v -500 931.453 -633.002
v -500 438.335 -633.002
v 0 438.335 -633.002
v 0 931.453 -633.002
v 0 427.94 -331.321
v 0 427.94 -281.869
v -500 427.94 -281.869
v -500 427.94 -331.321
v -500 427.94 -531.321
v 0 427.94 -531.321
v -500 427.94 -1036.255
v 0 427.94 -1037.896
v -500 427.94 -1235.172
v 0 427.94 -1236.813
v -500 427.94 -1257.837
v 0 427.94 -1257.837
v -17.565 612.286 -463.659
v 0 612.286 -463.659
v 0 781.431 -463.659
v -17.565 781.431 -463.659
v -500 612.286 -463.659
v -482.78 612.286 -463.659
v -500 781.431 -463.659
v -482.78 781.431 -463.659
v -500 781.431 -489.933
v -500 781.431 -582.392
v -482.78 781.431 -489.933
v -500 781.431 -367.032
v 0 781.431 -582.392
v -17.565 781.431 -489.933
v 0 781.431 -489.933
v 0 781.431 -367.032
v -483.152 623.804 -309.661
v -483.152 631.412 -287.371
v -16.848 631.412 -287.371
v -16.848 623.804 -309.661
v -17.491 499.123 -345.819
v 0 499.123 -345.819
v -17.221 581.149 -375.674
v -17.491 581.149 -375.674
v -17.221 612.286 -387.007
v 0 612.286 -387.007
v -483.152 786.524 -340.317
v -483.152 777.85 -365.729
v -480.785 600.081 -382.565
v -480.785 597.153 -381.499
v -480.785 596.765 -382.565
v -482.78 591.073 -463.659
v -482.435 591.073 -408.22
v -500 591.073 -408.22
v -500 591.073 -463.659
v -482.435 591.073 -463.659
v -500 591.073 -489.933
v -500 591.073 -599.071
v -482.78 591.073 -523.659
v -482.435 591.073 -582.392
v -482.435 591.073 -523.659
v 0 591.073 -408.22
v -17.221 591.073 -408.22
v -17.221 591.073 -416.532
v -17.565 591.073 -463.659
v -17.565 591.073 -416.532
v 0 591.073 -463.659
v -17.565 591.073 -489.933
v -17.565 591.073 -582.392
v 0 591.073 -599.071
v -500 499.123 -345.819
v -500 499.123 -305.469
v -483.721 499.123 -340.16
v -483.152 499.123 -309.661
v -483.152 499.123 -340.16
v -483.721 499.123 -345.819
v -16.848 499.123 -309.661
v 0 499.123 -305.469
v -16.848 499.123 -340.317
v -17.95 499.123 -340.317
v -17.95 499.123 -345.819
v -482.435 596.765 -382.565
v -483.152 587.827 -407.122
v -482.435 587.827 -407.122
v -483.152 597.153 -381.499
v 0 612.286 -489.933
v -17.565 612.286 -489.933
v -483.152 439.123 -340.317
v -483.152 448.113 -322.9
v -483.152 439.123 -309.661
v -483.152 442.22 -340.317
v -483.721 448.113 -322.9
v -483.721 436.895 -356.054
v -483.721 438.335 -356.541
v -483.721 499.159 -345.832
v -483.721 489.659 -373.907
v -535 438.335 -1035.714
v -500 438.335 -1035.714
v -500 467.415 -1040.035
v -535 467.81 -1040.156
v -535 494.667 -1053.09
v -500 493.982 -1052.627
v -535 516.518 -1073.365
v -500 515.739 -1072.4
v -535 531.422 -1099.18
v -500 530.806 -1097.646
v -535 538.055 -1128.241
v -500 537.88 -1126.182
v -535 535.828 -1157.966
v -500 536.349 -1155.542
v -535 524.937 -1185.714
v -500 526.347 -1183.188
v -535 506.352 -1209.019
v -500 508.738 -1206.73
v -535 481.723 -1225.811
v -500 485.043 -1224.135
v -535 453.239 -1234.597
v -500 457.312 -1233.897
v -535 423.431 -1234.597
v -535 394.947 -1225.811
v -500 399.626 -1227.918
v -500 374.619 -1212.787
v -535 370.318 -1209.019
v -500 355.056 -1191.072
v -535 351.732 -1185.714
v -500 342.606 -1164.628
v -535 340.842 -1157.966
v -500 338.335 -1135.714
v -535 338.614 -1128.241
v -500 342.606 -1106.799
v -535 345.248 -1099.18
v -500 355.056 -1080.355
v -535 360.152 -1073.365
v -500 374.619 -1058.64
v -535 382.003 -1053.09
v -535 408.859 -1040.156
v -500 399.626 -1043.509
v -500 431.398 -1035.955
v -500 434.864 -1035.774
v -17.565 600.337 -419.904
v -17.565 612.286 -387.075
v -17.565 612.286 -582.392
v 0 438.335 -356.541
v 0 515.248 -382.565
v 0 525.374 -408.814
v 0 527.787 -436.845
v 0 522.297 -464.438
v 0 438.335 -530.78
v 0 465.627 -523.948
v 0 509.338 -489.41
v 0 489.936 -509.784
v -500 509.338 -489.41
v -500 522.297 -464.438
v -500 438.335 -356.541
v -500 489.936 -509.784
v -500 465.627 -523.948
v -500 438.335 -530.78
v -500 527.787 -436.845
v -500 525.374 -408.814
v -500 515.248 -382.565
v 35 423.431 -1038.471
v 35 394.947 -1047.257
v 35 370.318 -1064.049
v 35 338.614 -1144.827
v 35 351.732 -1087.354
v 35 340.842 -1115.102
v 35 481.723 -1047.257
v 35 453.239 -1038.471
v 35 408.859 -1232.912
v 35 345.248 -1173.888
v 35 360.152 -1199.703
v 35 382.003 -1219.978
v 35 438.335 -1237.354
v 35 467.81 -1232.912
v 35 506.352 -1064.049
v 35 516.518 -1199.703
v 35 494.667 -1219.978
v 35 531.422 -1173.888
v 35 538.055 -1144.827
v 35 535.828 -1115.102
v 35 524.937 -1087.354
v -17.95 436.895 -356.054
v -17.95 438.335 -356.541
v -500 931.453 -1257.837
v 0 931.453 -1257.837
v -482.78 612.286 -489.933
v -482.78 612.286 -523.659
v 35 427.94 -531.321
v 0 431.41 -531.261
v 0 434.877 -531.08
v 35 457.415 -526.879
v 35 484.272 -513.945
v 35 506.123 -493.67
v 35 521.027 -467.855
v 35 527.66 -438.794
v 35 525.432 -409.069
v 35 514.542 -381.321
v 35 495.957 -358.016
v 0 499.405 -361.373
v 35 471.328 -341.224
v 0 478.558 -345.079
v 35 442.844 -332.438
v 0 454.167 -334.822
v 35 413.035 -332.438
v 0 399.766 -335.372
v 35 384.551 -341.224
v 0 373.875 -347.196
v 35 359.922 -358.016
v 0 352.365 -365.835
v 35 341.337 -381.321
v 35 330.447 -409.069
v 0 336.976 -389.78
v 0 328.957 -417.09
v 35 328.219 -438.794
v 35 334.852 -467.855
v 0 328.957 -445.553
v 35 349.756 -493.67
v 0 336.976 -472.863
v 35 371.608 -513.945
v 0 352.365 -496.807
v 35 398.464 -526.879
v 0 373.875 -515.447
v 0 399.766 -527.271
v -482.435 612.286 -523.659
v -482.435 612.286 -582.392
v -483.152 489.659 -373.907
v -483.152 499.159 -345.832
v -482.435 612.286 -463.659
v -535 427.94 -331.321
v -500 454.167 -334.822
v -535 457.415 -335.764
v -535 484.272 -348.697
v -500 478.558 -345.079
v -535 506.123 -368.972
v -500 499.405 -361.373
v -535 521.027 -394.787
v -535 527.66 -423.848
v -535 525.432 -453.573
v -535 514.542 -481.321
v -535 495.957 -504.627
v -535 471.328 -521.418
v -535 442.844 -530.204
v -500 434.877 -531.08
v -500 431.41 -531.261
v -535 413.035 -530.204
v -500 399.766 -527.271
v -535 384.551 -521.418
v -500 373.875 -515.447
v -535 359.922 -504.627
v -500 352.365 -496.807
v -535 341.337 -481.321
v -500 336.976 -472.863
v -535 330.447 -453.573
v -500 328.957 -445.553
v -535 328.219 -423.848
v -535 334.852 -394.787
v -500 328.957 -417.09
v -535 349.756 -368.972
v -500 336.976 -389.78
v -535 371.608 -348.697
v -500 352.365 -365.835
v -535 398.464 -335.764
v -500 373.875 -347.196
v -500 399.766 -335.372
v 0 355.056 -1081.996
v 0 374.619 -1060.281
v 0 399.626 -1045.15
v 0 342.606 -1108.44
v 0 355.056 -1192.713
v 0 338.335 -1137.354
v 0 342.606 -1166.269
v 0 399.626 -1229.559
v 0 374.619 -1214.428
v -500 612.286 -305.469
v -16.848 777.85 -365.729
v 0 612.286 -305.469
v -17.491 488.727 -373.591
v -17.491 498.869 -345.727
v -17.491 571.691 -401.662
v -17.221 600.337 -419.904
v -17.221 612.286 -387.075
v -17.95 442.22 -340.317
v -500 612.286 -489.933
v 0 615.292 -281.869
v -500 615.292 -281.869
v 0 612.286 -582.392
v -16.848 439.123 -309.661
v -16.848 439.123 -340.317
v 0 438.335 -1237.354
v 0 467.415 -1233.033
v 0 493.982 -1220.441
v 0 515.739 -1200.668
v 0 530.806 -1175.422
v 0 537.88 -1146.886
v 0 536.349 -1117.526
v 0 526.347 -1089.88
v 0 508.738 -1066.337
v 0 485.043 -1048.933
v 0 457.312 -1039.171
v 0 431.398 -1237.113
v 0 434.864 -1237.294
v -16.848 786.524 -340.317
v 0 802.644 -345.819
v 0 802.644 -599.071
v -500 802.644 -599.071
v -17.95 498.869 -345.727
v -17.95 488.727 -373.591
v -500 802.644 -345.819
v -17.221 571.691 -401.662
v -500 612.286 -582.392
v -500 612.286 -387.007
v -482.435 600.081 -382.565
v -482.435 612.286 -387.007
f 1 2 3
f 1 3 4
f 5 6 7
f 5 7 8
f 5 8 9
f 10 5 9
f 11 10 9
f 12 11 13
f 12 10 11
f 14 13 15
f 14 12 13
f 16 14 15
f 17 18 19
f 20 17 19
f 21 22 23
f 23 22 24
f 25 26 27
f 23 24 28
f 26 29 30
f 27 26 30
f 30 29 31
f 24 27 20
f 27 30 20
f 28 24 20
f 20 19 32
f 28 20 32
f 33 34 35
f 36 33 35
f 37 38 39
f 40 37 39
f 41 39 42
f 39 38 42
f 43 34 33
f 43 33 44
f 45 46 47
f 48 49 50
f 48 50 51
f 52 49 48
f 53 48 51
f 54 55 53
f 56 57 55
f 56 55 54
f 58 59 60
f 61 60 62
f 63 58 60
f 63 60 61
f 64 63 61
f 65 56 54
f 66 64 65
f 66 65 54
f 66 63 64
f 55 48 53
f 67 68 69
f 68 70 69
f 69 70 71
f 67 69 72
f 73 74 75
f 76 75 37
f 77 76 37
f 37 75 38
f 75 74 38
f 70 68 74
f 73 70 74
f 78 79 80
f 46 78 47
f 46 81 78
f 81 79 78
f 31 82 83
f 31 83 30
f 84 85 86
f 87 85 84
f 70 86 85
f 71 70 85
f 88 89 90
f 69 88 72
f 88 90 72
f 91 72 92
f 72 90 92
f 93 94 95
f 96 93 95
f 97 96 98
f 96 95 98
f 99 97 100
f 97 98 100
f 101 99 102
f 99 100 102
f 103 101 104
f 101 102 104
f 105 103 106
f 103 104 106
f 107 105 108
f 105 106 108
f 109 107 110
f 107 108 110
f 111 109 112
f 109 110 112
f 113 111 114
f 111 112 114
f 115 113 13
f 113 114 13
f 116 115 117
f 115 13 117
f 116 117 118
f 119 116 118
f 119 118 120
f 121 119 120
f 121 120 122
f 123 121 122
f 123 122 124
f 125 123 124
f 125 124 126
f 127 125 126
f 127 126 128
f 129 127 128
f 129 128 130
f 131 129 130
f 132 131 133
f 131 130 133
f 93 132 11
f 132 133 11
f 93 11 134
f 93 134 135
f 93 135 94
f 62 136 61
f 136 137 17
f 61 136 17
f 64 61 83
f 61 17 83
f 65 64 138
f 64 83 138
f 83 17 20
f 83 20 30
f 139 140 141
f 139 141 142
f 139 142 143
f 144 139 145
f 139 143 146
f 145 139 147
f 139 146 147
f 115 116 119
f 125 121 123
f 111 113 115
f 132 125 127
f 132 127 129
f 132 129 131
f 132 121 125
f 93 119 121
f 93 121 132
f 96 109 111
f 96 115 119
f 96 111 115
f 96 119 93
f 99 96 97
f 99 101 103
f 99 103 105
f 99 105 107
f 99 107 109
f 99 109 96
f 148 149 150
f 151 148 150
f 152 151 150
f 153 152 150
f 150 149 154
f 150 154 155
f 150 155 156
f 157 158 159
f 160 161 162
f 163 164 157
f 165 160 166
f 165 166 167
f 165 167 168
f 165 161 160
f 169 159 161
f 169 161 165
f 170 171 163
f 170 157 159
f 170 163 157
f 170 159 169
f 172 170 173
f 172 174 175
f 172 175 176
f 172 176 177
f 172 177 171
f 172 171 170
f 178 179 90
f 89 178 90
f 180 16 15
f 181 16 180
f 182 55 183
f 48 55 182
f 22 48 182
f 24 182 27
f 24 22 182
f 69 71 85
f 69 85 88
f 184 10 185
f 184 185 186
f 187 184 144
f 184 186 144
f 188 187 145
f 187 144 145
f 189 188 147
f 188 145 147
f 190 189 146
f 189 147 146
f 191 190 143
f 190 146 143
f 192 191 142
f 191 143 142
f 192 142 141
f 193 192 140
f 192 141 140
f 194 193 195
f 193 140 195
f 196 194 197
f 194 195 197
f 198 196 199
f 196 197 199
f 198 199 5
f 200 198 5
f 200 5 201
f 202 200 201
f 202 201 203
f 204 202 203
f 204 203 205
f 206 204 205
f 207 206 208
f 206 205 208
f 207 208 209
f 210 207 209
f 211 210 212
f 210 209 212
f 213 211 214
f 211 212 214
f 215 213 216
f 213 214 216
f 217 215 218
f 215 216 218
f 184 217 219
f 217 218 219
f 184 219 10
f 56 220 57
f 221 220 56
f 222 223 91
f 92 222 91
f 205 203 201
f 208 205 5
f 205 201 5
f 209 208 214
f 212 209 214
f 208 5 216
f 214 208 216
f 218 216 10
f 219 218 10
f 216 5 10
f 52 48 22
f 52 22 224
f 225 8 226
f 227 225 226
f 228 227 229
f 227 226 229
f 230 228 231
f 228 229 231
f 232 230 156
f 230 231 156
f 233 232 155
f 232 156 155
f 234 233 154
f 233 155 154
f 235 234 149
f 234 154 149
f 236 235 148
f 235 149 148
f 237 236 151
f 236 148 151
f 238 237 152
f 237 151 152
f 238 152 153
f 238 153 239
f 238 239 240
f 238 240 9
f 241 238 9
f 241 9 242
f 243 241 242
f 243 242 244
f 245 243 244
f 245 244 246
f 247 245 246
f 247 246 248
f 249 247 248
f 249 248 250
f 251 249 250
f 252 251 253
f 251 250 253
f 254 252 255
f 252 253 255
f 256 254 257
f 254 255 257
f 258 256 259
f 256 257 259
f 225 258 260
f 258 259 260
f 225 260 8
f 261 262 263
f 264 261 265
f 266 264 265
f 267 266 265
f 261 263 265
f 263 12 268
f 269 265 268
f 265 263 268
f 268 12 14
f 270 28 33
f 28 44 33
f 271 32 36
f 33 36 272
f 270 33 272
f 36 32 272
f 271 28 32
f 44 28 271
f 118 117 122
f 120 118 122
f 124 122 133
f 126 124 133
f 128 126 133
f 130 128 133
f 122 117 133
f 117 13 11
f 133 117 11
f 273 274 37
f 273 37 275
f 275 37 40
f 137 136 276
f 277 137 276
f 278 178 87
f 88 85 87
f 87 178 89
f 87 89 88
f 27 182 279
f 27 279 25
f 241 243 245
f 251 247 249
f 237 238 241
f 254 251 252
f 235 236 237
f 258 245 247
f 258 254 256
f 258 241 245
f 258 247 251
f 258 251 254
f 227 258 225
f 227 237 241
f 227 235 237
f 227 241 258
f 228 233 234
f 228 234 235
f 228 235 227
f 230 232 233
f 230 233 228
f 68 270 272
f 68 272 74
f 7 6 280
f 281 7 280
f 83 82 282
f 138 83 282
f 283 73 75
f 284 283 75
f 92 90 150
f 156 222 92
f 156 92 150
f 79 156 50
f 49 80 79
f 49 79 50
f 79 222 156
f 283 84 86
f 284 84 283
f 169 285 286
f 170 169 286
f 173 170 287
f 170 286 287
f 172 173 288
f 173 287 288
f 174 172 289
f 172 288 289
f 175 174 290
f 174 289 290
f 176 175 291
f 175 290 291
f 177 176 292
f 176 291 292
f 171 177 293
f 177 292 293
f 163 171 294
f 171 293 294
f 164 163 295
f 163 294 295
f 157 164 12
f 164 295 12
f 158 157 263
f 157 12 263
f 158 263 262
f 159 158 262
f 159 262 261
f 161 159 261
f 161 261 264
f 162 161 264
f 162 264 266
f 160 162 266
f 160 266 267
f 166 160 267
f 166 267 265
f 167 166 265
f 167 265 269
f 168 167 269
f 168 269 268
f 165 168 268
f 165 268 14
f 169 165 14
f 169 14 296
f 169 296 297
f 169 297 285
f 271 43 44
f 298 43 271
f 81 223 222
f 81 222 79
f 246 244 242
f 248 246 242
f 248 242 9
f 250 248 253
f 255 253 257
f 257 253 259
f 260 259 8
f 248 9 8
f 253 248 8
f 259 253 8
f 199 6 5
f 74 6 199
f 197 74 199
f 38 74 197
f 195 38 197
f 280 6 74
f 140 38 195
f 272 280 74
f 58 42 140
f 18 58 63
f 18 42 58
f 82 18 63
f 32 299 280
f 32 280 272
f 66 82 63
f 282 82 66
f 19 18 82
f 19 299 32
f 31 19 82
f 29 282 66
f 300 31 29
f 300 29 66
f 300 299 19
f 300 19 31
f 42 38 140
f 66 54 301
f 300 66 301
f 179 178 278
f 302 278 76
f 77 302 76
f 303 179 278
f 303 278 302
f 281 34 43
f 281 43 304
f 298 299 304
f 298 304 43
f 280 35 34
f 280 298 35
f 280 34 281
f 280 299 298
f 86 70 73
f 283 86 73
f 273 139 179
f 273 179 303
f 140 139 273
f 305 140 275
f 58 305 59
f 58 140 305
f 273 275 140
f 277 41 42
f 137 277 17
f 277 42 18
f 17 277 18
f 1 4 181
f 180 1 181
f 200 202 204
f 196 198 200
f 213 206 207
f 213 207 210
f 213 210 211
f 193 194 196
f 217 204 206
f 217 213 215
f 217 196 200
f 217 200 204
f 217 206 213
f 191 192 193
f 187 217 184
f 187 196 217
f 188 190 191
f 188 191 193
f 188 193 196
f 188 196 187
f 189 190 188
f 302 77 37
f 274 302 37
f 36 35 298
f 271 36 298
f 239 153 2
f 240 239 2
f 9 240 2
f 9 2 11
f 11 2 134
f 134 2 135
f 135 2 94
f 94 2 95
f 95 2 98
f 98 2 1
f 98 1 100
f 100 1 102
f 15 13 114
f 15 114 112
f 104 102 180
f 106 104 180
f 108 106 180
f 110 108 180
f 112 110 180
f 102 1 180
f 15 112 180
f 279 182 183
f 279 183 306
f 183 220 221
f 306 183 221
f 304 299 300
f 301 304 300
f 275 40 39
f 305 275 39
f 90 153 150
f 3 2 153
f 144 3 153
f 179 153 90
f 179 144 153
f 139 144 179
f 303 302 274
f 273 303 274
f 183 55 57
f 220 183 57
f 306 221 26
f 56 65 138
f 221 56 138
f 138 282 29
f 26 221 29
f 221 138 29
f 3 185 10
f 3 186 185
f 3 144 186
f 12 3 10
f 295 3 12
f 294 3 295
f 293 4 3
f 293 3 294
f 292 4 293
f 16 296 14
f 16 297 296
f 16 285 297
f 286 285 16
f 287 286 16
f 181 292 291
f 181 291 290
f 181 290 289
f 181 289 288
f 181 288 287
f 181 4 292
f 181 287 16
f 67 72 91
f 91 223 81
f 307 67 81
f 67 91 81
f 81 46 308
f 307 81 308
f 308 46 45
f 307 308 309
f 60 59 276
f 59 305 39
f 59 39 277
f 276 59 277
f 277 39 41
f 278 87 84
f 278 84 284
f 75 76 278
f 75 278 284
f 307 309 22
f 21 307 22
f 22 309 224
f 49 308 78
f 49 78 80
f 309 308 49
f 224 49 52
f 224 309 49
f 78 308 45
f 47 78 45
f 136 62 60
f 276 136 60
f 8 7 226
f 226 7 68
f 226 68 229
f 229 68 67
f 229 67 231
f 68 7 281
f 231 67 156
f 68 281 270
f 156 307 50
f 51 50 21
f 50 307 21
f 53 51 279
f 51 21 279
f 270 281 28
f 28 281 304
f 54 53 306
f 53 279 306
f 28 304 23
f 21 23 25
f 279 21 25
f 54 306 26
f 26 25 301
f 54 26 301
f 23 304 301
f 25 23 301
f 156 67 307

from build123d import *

# Parameters (mm, degrees)
IZIM2_W                     = 624.83438286
IZIM2_H                     = 493.118424104
Y_KSEKLIK_EKSTR_ZYON1_DEPTH = 500
IZIM4_R                     = 100
Y_KSEKLIK_EKSTR_ZYON2_DEPTH = 35
IZIM5_W                     = 975.967830922
IZIM5_H                     = 10.395315862
Y_KSEKLIK_EKSTR_ZYON3_DEPTH = 500
IZIM6_W                     = 317.202351564
IZIM6_H                     = 374.704466417
Y_KSEKLIK_EKSTR_ZYON4_DEPTH = 500
KES_EKSTR_ZYON1_DEPTH       = 500
KES_EKSTR_ZYON2_DEPTH       = 500
KES_EKSTR_ZYON3_DEPTH       = 500
IZIM11_R                    = 100
Y_KSEKLIK_EKSTR_ZYON5_DEPTH = 35
IZIM12_W                    = 466.303391348
IZIM12_H                    = 163.89871841
KES_EKSTR_ZYON4_DEPTH       = 35
IZIM17_W                    = 464.870730912
IZIM17_H                    = 199.827267797
KES_EKSTR_ZYON7_DEPTH       = 35
IZIM20_W                    = 465.660425645
IZIM20_H                    = 104.591429086
KES_EKSTR_ZYON8_DEPTH       = 35
IZIM21_W                    = 463.56331291
IZIM21_H                    = 33.15833205
KES_EKSTR_ZYON9_DEPTH       = 35
IZIM22_W                    = 465.770217683
IZIM22_H                    = 55.70279957
KES_EKSTR_ZYON10_DEPTH      = 35
IZIM23_W                    = 466.303391348
IZIM23_H                    = 30.655819637
KES_EKSTR_ZYON11_DEPTH      = 60
IZIM25_W                    = 26.274086754
IZIM25_H                    = 211.571078613
Y_KSEKLIK_EKSTR_ZYON6_DEPTH = 500
IZIM27_W                    = 465.215365456
IZIM27_H                    = 190.357875177
KES_EKSTR_ZYON12_DEPTH      = 60
IZIM28_R                    = 100
Y_KSEKLIK_EKSTR_ZYON7_DEPTH = 35


with BuildPart() as part:
    # Çizim2 → Yükseklik-Ekstrüzyon1 (new body)
    with BuildSketch(Plane(origin=(0, 0, 0), x_dir=(0, 0, -1), z_dir=(1, 0, 0))):
        with Locations((945.419542605, 684.894087956)):
            Rectangle(IZIM2_W, IZIM2_H)
    extrude(amount=-Y_KSEKLIK_EKSTR_ZYON1_DEPTH)

    # Çizim4 → Yükseklik-Ekstrüzyon2 (add)
    with BuildSketch(Plane(origin=(0, 0, 0), x_dir=(0, 0, -1), z_dir=(1, 0, 0))):
        with Locations((1137.354295612, 438.334875904)):
            Circle(IZIM4_R)
    extrude(amount=Y_KSEKLIK_EKSTR_ZYON2_DEPTH)

    # Çizim5 → Yükseklik-Ekstrüzyon3 (add)
    with BuildSketch(Plane(origin=(0, 0, 0), x_dir=(0, 0, -1), z_dir=(1, 0, 0))):
        with Locations((769.852818574, 433.137217973)):
            Rectangle(IZIM5_W, IZIM5_H)
    extrude(amount=-Y_KSEKLIK_EKSTR_ZYON3_DEPTH)

    # Çizim6 → Yükseklik-Ekstrüzyon4 (add)
    with BuildSketch(Plane(origin=(0, 0, 0), x_dir=(0, 0, -1), z_dir=(1, 0, 0))):
        with Locations((440.470078895, 615.291793251)):
            Rectangle(IZIM6_W, IZIM6_H)
    extrude(amount=-Y_KSEKLIK_EKSTR_ZYON4_DEPTH)

    # Çizim7 → Kes-Ekstrüzyon1 (cut)
    with BuildSketch(Plane(origin=(0, 0, 0), x_dir=(0, 0, -1), z_dir=(1, 0, 0))):
        Polygon((281.868903113, 802.644026459), (345.819234143, 802.644026459), (281.868903113, 615.29179325), align=None)
    extrude(amount=-KES_EKSTR_ZYON1_DEPTH, mode=Mode.SUBTRACT)

    # Çizim8 → Kes-Ekstrüzyon2 (cut)
    with BuildSketch(Plane(origin=(0, 0, 0), x_dir=(0, 0, -1), z_dir=(1, 0, 0))):
        Polygon((367.032437579, 781.430823023), (305.46881178, 612.286151281), (305.46881178, 499.123252309), (345.819234143, 499.123252309), (387.007160993, 612.286151281), (582.392266599, 612.286151281), (582.392266599, 781.430823023), align=None)
    extrude(amount=-KES_EKSTR_ZYON2_DEPTH, mode=Mode.SUBTRACT)

    # Çizim10 → Kes-Ekstrüzyon3 (cut)
    with BuildSketch(Plane(origin=(0, 0, 0), x_dir=(0, 0, -1), z_dir=(1, 0, 0))):
        Polygon((599.071254677, 438.334875904), (356.541223106, 438.334875904), (408.220364428, 591.072947846), (599.071254677, 591.072947846), align=None)
    extrude(amount=-KES_EKSTR_ZYON3_DEPTH, mode=Mode.SUBTRACT)

    # Çizim11 → Yükseklik-Ekstrüzyon5 (add)
    with BuildSketch(Plane(origin=(0, 0, 0), x_dir=(0, 0, -1), z_dir=(1, 0, 0))):
        with Locations((431.321316174, 427.939560042)):
            Circle(IZIM11_R)
    extrude(amount=Y_KSEKLIK_EKSTR_ZYON5_DEPTH)

    # Çizim12 → Kes-Ekstrüzyon4 (cut)
    with BuildSketch(Plane(origin=(0, -21.964844226, -64.349355999), x_dir=(1, 0, 0), z_dir=(0, 0.323037077, 0.94638631))):
        with Locations((-250, 772.34079435)):
            Rectangle(IZIM12_W, IZIM12_H)
    extrude(amount=-KES_EKSTR_ZYON4_DEPTH, mode=Mode.SUBTRACT)

    # Çizim17 → Kes-Ekstrüzyon7 (cut)
    with BuildSketch(Plane(origin=(0, 612.286151281, 0), x_dir=(1, 0, 0), z_dir=(0, 1, 0))):
        with Locations((-250, 482.478632701)):
            Rectangle(IZIM17_W, IZIM17_H)
    extrude(amount=-KES_EKSTR_ZYON7_DEPTH, mode=Mode.SUBTRACT)

    # Çizim20 → Kes-Ekstrüzyon8 (cut)
    with BuildSketch(Plane(origin=(0, -52.757830226, -144.950947246), x_dir=(1, 0, 0), z_dir=(0, 0.342020143, 0.939692621))):
        with Locations((-250.321482852, 639.324434245)):
            Rectangle(IZIM20_W, IZIM20_H)
    extrude(amount=-KES_EKSTR_ZYON8_DEPTH, mode=Mode.SUBTRACT)

    # Çizim21 → Kes-Ekstrüzyon9 (cut)
    with BuildSketch(Plane(origin=(0, -52.757830226, -144.950947246), x_dir=(1, 0, 0), z_dir=(0, 0.342020143, 0.939692621))):
        with Locations((-249.003107825, 691.169166414)):
            Rectangle(IZIM21_W, IZIM21_H)
    extrude(amount=-KES_EKSTR_ZYON9_DEPTH, mode=Mode.SUBTRACT)

    # Çizim22 → Kes-Ekstrüzyon10 (cut)
    with BuildSketch(Plane(origin=(0, -63.217651249, -186.84022059), x_dir=(-1, 0, 0), z_dir=(0, -0.320502572, -0.947247645))):
        with Locations((250.835570057, 555.815526561)):
            Rectangle(IZIM22_W, IZIM22_H)
    extrude(amount=-KES_EKSTR_ZYON10_DEPTH, mode=Mode.SUBTRACT)

    # Çizim23 → Kes-Ekstrüzyon11 (cut)
    with BuildSketch(Plane(origin=(0, 499.123252309, 0), x_dir=(1, 0, 0), z_dir=(0, 1, 0))):
        with Locations((-250, 324.988840267)):
            Rectangle(IZIM23_W, IZIM23_H)
    extrude(amount=-KES_EKSTR_ZYON11_DEPTH, mode=Mode.SUBTRACT)

    # Çizim25 → Yükseklik-Ekstrüzyon6 (add)
    with BuildSketch(Plane(origin=(0, 0, 0), x_dir=(0, 0, -1), z_dir=(1, 0, 0))):
        with Locations((476.795697093, 696.858487153)):
            Rectangle(IZIM25_W, IZIM25_H)
    extrude(amount=-Y_KSEKLIK_EKSTR_ZYON6_DEPTH)

    # Çizim27 → Kes-Ekstrüzyon12 (cut)
    with BuildSketch(Plane.XY.offset(-463.658653716)):
        with Locations((-250.172317272, 686.251885435)):
            Rectangle(IZIM27_W, IZIM27_H)
    extrude(amount=-KES_EKSTR_ZYON12_DEPTH, mode=Mode.SUBTRACT)

    # Çizim28 → Yükseklik-Ekstrüzyon7 (add)
    with BuildSketch(Plane.ZY.offset(500)):
        with Locations((-431.321316174, 427.939560042)):
            Circle(IZIM28_R)
        with Locations((-1135.713642363, 438.334875904)):
            Circle(IZIM28_R)
    extrude(amount=Y_KSEKLIK_EKSTR_ZYON7_DEPTH)


solid = part.part
